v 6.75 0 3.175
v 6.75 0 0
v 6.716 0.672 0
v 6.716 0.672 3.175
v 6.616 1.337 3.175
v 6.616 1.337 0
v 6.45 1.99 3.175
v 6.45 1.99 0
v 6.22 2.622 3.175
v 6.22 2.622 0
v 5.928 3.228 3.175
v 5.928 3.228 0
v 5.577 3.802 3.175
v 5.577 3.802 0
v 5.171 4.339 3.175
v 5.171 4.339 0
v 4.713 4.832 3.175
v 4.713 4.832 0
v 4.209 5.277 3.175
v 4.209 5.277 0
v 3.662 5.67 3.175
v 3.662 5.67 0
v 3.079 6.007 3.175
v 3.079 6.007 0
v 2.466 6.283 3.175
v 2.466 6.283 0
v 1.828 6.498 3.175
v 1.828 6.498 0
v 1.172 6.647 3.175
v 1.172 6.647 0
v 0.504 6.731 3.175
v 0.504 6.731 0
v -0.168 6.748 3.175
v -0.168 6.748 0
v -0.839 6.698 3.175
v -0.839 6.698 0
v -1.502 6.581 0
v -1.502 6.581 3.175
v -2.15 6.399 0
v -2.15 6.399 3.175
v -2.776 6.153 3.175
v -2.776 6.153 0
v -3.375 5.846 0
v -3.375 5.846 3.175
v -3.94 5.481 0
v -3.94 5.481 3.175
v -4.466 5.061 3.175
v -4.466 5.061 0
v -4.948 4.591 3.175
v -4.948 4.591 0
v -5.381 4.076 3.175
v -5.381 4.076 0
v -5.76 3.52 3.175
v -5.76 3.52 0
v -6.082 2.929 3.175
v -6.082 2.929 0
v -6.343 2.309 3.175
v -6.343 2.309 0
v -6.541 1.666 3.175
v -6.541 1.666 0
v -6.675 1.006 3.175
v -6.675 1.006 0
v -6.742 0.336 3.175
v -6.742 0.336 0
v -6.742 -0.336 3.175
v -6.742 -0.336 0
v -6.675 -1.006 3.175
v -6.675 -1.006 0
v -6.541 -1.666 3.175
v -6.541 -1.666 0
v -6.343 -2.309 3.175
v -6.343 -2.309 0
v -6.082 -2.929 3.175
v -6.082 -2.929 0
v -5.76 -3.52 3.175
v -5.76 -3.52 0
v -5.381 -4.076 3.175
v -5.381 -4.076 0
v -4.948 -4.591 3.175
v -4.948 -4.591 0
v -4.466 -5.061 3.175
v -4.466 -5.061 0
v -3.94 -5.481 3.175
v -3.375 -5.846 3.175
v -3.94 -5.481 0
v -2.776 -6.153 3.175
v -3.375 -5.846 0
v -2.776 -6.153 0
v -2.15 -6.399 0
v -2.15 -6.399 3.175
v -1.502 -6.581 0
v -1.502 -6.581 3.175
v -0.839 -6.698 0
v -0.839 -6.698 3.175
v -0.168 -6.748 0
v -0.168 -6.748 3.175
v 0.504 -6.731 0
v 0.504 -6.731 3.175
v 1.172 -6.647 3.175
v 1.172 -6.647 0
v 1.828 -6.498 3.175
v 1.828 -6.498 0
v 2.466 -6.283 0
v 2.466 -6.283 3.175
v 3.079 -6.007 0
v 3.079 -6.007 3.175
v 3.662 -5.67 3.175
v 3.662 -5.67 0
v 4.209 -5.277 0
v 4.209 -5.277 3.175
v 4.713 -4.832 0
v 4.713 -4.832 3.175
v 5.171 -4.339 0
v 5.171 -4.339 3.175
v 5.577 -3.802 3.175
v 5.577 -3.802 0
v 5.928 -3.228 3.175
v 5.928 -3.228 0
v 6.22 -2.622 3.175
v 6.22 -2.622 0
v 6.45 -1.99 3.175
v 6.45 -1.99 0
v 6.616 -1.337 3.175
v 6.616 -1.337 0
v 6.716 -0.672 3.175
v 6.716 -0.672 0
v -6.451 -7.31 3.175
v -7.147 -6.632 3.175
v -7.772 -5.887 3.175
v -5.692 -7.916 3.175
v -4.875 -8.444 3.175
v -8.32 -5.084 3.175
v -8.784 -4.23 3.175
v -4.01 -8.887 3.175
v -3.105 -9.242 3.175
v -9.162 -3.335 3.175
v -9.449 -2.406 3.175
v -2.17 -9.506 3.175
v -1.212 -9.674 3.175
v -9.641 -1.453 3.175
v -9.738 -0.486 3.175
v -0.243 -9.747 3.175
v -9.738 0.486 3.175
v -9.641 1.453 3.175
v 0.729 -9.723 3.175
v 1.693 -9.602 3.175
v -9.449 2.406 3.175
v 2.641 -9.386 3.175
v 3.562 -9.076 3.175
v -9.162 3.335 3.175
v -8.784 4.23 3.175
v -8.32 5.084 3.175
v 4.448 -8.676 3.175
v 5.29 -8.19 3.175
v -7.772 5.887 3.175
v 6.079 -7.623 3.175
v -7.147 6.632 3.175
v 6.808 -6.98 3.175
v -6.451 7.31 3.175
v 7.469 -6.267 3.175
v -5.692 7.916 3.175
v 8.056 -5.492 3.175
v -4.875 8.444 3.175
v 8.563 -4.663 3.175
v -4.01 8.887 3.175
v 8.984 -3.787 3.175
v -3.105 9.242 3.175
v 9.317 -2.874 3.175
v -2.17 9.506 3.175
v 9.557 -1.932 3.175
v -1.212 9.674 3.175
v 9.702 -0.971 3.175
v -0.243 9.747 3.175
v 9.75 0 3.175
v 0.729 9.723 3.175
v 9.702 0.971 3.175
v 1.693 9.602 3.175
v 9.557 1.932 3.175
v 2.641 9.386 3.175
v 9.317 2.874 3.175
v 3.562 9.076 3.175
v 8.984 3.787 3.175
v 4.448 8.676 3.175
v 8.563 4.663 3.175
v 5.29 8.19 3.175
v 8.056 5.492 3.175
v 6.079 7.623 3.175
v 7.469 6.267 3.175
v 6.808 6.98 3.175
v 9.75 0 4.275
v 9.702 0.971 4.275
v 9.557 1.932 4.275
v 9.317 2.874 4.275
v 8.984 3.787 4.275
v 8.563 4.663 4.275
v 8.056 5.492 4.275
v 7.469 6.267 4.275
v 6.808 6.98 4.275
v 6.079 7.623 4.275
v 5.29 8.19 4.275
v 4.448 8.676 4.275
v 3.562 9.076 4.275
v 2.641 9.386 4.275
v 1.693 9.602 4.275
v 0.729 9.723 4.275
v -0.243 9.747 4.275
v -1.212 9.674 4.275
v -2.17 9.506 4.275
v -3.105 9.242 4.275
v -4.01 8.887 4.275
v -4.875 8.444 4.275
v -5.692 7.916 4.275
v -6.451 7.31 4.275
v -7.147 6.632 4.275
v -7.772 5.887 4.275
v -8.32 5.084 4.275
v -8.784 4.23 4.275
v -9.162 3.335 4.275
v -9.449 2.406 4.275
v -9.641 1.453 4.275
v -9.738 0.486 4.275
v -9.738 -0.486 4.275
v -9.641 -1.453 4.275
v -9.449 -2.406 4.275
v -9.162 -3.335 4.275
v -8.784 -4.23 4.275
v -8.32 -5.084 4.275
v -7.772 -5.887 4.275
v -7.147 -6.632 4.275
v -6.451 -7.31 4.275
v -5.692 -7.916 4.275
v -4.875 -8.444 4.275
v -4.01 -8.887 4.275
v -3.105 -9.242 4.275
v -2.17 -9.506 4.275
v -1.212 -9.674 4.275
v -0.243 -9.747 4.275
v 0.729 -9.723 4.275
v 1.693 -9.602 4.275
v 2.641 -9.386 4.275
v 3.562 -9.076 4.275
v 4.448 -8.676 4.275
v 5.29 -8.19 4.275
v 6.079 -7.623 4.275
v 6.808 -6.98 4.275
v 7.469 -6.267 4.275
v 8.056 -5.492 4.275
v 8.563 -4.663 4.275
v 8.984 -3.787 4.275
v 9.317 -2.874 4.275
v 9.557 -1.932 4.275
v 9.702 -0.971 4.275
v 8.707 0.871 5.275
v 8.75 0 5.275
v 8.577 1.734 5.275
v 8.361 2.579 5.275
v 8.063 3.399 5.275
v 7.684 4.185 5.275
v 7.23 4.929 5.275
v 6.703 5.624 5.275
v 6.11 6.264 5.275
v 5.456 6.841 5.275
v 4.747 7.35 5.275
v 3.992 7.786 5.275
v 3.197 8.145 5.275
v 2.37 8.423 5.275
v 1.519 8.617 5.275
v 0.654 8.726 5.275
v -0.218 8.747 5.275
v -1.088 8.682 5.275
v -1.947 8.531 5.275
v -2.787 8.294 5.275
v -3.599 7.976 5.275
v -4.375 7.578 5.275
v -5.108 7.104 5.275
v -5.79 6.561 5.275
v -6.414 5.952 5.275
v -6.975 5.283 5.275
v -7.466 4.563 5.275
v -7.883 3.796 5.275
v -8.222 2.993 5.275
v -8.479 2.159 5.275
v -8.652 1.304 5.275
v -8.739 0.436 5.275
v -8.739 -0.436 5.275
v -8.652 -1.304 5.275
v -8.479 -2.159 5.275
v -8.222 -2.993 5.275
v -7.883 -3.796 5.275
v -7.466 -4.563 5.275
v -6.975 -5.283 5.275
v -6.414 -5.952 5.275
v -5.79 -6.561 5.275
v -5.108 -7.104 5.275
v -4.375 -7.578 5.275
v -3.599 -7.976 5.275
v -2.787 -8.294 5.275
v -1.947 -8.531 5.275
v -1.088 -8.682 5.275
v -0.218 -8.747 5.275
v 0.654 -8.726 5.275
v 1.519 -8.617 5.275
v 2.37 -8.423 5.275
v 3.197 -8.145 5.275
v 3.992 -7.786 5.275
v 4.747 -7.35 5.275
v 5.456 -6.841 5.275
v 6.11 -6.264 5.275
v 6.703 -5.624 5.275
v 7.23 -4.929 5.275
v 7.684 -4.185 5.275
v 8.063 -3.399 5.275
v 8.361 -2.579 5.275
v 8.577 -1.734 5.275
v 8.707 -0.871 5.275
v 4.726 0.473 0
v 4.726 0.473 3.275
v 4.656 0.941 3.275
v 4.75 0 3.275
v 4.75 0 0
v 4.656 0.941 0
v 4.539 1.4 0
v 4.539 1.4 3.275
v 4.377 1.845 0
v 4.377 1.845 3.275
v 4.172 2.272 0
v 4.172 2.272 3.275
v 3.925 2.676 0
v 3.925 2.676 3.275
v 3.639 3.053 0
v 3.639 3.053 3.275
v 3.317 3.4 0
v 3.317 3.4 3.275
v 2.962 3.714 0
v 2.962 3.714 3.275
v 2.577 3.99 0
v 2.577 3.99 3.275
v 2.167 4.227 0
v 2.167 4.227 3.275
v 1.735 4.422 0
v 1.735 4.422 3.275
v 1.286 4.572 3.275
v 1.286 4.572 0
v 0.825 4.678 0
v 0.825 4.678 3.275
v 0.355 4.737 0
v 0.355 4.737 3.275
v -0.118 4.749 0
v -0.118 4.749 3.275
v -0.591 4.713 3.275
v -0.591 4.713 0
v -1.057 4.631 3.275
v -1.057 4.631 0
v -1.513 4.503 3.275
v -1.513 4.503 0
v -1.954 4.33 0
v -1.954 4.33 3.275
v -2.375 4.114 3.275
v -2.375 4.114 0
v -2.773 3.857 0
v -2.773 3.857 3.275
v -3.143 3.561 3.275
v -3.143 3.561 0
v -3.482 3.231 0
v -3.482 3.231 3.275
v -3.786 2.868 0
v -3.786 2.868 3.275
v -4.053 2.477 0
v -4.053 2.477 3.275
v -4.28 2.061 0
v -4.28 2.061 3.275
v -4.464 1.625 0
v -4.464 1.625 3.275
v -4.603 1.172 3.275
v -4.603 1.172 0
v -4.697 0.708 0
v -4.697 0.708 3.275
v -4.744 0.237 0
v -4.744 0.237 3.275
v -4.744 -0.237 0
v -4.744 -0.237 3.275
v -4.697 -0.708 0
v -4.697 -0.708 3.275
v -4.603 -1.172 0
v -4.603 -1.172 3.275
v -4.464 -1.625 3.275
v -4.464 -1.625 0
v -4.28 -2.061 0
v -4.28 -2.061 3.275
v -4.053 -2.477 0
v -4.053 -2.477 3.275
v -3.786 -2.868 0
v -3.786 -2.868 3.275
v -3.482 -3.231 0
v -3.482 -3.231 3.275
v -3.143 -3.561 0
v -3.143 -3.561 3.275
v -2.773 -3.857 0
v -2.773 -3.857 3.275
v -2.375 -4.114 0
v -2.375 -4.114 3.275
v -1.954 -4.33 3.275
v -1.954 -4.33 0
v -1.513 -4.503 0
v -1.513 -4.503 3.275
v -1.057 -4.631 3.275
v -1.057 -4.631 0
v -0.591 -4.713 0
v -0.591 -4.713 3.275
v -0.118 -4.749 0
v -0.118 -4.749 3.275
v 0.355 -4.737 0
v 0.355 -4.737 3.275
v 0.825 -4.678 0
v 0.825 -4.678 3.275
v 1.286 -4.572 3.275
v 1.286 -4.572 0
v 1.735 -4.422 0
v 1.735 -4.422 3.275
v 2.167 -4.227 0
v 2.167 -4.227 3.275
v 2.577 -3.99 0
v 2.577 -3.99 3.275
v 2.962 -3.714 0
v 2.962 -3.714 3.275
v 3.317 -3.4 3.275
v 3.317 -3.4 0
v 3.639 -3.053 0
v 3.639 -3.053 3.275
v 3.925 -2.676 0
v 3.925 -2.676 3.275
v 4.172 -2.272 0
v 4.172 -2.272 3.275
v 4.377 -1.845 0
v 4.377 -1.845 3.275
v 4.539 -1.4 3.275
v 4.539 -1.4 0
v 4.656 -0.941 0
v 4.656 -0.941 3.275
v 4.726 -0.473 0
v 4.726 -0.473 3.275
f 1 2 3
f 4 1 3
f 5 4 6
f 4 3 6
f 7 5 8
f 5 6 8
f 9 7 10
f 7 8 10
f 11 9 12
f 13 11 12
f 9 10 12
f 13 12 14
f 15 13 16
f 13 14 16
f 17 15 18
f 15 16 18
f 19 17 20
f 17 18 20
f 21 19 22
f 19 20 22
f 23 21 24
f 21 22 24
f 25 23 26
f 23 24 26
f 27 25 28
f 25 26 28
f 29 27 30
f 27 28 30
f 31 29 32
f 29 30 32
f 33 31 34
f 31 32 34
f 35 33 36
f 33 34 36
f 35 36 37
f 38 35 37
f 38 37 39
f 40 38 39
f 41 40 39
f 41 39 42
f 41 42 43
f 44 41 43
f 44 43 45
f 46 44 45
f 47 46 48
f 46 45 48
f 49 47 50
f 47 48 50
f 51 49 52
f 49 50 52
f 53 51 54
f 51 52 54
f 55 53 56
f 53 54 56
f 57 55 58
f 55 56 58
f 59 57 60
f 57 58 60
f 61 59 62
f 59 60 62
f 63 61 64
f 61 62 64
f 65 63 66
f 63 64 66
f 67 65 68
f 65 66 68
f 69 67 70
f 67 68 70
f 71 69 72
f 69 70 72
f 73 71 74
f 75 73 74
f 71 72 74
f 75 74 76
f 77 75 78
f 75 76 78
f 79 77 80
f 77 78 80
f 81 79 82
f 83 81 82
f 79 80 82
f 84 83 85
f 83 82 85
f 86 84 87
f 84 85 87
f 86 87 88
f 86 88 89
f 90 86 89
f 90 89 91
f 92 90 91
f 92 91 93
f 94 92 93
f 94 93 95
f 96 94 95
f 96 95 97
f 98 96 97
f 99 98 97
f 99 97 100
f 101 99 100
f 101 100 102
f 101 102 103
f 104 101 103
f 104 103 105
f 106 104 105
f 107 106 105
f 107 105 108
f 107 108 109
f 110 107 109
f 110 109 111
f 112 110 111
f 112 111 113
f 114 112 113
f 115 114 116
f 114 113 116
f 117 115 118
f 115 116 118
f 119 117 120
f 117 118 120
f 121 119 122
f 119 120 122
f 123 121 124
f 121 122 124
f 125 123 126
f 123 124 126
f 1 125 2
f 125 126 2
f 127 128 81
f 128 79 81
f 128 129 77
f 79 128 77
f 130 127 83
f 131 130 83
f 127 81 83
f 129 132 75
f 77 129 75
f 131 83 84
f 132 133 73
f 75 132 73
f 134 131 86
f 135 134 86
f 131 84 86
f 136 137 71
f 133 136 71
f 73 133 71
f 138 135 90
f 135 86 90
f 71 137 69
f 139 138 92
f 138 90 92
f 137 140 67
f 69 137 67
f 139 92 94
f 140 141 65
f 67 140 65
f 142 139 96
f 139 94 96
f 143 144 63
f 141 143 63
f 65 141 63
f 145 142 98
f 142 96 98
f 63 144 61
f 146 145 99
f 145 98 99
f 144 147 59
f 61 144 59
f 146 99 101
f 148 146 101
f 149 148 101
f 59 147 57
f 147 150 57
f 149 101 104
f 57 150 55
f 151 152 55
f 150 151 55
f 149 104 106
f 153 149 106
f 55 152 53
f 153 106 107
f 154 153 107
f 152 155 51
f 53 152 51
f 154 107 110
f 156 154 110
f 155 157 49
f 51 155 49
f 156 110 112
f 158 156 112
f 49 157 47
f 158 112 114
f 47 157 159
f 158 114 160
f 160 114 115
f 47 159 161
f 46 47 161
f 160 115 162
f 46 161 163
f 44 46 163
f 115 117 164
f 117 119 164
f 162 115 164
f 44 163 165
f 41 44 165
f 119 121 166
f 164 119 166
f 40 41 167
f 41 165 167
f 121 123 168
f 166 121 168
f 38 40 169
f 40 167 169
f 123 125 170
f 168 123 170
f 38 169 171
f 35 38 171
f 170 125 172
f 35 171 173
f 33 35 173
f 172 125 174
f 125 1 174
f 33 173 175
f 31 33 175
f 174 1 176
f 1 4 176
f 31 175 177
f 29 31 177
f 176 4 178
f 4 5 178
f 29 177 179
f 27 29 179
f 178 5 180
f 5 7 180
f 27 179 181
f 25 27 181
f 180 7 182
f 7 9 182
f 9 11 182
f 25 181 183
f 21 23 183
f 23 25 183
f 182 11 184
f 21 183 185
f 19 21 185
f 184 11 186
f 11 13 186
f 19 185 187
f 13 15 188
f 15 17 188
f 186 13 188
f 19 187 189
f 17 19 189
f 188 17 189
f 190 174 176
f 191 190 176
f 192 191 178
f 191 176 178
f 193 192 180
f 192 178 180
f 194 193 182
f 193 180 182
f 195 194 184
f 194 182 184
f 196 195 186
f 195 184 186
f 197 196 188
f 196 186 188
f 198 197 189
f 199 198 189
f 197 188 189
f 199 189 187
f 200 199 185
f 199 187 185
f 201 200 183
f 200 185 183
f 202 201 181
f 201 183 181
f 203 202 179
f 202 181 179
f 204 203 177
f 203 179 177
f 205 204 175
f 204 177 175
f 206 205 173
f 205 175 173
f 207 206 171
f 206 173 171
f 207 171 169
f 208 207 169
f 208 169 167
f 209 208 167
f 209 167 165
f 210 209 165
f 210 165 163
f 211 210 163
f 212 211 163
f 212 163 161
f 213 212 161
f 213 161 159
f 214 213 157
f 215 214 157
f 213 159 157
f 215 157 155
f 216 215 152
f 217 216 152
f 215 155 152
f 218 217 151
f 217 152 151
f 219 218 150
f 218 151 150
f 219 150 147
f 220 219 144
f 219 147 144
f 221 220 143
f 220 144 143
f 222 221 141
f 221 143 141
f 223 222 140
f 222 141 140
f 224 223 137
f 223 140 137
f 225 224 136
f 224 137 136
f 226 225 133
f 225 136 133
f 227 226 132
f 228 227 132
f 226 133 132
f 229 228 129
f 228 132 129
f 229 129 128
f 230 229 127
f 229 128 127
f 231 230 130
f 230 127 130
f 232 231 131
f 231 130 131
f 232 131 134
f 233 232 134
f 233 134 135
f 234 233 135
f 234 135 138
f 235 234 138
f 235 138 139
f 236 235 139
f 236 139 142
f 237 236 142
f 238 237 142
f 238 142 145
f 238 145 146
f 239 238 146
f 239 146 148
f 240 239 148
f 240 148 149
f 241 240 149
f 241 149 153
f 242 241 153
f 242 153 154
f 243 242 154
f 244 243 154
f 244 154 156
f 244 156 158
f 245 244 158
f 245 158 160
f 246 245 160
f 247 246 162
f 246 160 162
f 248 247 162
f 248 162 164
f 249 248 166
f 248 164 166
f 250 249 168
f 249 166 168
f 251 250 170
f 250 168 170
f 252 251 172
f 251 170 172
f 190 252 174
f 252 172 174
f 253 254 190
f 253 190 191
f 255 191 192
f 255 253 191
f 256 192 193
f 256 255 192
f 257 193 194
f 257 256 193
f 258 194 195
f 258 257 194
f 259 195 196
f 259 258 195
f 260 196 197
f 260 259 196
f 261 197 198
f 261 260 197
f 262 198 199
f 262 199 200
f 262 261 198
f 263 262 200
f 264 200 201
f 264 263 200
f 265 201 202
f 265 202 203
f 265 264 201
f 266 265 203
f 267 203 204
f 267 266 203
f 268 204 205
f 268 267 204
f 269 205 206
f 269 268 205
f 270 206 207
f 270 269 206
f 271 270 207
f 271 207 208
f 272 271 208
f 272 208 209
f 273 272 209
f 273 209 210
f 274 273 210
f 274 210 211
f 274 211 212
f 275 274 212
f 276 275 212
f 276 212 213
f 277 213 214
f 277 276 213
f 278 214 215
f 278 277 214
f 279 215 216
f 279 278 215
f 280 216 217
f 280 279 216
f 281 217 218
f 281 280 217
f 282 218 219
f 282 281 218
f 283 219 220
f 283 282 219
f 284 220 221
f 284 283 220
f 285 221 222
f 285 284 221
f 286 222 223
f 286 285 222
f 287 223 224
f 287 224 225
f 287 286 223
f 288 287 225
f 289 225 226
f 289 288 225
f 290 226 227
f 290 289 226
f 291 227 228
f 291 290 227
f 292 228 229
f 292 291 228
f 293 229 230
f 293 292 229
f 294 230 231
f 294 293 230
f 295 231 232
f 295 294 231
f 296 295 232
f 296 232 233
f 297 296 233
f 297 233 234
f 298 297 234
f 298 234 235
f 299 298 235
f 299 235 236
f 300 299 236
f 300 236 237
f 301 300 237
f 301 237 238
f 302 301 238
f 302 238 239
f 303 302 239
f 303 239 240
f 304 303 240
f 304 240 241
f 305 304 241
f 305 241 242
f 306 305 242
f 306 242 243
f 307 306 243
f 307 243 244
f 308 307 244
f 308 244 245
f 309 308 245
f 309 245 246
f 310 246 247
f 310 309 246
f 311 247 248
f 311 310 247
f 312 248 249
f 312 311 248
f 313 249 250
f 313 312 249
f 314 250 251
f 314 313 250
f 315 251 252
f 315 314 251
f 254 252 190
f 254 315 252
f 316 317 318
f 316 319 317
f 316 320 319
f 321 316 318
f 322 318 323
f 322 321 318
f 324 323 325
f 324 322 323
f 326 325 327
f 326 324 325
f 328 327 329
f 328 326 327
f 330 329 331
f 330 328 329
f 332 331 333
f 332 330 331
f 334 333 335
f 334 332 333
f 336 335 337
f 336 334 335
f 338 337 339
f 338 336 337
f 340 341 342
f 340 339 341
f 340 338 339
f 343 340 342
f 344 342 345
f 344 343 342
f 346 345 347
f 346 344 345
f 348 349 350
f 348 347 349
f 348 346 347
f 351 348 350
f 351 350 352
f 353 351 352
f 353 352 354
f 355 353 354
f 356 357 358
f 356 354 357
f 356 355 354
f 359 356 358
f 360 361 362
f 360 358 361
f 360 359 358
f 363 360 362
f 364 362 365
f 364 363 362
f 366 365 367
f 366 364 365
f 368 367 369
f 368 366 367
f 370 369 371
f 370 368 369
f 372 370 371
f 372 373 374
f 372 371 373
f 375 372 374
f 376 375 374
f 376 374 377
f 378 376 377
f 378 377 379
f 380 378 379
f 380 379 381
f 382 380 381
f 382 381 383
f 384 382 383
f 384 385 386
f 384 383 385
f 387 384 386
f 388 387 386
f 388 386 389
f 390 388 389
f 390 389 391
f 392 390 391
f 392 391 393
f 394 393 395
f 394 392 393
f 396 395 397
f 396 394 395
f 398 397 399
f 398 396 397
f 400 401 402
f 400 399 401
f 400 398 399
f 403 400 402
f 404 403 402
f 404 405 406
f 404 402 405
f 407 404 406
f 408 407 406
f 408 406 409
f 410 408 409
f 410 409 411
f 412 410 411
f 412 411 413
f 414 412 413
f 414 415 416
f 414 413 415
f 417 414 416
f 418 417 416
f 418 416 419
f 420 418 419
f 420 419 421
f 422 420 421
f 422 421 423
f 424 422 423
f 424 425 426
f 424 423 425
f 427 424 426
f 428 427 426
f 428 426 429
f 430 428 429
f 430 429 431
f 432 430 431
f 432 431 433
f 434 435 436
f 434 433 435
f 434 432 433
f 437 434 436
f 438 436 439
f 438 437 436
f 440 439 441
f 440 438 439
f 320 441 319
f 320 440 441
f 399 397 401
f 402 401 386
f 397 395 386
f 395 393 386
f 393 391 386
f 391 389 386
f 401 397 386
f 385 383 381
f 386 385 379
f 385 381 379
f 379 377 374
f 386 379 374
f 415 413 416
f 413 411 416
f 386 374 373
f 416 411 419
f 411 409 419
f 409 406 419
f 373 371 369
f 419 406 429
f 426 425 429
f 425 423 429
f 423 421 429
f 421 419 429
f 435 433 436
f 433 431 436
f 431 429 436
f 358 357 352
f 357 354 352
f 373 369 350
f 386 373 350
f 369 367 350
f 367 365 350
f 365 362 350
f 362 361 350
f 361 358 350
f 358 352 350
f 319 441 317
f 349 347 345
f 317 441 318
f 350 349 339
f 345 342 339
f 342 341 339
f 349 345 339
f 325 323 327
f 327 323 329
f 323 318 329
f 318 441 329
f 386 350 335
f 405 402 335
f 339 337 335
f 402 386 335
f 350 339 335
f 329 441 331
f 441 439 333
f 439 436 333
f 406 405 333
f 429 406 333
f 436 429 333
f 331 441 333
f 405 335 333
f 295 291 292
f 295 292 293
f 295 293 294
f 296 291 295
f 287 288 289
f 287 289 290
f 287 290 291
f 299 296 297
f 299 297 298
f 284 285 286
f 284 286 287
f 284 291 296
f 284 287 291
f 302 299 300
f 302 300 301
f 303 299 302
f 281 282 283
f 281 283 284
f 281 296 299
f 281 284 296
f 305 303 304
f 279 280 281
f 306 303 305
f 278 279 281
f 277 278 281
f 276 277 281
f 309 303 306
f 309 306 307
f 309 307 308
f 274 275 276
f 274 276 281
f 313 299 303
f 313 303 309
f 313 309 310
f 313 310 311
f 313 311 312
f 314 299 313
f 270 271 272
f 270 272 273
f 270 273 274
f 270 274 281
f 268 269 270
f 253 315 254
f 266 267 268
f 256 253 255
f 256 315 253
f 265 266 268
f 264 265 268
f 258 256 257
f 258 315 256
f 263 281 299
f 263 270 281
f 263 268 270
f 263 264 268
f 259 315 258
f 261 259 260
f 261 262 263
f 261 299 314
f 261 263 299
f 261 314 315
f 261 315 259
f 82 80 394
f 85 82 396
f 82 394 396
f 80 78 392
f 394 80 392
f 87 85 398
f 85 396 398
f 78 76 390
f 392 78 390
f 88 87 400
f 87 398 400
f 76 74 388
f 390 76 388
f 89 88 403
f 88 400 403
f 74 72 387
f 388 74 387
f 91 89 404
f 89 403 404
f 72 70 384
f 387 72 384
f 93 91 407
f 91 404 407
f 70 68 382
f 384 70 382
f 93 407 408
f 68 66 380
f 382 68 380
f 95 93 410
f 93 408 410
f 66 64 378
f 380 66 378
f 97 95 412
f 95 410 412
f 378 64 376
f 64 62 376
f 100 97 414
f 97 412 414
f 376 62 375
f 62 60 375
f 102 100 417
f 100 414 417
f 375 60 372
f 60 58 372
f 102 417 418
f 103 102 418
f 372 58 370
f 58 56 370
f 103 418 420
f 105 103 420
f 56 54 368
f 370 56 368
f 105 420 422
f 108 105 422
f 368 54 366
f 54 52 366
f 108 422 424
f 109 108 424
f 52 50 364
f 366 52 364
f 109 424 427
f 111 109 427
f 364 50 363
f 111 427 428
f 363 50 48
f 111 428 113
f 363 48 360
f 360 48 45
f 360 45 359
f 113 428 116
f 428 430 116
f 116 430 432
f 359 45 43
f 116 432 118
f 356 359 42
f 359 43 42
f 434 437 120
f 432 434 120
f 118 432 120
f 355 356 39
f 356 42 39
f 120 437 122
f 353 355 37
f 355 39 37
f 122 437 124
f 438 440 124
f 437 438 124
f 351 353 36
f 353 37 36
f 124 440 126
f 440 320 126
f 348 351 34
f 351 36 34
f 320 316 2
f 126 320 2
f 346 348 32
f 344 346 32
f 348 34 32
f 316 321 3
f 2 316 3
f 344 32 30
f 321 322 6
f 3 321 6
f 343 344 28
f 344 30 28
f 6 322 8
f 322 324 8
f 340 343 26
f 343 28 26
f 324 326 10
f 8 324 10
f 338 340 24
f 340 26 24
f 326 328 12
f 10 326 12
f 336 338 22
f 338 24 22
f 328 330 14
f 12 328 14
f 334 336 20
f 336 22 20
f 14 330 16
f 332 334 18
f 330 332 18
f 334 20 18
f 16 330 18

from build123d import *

# Parameters (mm, degrees)
F0_R     = 6.75
F1_DEPTH = 3.175
F2_R     = 9.75
F3_DEPTH = 2.1
F4_SIZE  = 1
F5_T     = -2


with BuildPart() as f1:
    # F0 (on Top) → F1 (new body)
    with BuildSketch(Plane.XY):
        Circle(F0_R)
    extrude(amount=F1_DEPTH)

    # F2 (on face) → F3 (join)
    with BuildSketch(Plane.XY.offset(3.175)):
        Circle(F2_R)
    extrude(amount=F3_DEPTH)

    # F4
    f4_edges = [f1.edges().sort_by_distance(p)[0] for p in [
        (-9.75, 0, 5.275),
    ]]
    chamfer(f4_edges, length=F4_SIZE)

    # F5
    f5_openings = [f1.faces().sort_by_distance(p)[0] for p in [
        (0, 0, 0),
    ]]
    offset(amount=F5_T, openings=f5_openings, kind=Kind.INTERSECTION)


solid = f1.part
